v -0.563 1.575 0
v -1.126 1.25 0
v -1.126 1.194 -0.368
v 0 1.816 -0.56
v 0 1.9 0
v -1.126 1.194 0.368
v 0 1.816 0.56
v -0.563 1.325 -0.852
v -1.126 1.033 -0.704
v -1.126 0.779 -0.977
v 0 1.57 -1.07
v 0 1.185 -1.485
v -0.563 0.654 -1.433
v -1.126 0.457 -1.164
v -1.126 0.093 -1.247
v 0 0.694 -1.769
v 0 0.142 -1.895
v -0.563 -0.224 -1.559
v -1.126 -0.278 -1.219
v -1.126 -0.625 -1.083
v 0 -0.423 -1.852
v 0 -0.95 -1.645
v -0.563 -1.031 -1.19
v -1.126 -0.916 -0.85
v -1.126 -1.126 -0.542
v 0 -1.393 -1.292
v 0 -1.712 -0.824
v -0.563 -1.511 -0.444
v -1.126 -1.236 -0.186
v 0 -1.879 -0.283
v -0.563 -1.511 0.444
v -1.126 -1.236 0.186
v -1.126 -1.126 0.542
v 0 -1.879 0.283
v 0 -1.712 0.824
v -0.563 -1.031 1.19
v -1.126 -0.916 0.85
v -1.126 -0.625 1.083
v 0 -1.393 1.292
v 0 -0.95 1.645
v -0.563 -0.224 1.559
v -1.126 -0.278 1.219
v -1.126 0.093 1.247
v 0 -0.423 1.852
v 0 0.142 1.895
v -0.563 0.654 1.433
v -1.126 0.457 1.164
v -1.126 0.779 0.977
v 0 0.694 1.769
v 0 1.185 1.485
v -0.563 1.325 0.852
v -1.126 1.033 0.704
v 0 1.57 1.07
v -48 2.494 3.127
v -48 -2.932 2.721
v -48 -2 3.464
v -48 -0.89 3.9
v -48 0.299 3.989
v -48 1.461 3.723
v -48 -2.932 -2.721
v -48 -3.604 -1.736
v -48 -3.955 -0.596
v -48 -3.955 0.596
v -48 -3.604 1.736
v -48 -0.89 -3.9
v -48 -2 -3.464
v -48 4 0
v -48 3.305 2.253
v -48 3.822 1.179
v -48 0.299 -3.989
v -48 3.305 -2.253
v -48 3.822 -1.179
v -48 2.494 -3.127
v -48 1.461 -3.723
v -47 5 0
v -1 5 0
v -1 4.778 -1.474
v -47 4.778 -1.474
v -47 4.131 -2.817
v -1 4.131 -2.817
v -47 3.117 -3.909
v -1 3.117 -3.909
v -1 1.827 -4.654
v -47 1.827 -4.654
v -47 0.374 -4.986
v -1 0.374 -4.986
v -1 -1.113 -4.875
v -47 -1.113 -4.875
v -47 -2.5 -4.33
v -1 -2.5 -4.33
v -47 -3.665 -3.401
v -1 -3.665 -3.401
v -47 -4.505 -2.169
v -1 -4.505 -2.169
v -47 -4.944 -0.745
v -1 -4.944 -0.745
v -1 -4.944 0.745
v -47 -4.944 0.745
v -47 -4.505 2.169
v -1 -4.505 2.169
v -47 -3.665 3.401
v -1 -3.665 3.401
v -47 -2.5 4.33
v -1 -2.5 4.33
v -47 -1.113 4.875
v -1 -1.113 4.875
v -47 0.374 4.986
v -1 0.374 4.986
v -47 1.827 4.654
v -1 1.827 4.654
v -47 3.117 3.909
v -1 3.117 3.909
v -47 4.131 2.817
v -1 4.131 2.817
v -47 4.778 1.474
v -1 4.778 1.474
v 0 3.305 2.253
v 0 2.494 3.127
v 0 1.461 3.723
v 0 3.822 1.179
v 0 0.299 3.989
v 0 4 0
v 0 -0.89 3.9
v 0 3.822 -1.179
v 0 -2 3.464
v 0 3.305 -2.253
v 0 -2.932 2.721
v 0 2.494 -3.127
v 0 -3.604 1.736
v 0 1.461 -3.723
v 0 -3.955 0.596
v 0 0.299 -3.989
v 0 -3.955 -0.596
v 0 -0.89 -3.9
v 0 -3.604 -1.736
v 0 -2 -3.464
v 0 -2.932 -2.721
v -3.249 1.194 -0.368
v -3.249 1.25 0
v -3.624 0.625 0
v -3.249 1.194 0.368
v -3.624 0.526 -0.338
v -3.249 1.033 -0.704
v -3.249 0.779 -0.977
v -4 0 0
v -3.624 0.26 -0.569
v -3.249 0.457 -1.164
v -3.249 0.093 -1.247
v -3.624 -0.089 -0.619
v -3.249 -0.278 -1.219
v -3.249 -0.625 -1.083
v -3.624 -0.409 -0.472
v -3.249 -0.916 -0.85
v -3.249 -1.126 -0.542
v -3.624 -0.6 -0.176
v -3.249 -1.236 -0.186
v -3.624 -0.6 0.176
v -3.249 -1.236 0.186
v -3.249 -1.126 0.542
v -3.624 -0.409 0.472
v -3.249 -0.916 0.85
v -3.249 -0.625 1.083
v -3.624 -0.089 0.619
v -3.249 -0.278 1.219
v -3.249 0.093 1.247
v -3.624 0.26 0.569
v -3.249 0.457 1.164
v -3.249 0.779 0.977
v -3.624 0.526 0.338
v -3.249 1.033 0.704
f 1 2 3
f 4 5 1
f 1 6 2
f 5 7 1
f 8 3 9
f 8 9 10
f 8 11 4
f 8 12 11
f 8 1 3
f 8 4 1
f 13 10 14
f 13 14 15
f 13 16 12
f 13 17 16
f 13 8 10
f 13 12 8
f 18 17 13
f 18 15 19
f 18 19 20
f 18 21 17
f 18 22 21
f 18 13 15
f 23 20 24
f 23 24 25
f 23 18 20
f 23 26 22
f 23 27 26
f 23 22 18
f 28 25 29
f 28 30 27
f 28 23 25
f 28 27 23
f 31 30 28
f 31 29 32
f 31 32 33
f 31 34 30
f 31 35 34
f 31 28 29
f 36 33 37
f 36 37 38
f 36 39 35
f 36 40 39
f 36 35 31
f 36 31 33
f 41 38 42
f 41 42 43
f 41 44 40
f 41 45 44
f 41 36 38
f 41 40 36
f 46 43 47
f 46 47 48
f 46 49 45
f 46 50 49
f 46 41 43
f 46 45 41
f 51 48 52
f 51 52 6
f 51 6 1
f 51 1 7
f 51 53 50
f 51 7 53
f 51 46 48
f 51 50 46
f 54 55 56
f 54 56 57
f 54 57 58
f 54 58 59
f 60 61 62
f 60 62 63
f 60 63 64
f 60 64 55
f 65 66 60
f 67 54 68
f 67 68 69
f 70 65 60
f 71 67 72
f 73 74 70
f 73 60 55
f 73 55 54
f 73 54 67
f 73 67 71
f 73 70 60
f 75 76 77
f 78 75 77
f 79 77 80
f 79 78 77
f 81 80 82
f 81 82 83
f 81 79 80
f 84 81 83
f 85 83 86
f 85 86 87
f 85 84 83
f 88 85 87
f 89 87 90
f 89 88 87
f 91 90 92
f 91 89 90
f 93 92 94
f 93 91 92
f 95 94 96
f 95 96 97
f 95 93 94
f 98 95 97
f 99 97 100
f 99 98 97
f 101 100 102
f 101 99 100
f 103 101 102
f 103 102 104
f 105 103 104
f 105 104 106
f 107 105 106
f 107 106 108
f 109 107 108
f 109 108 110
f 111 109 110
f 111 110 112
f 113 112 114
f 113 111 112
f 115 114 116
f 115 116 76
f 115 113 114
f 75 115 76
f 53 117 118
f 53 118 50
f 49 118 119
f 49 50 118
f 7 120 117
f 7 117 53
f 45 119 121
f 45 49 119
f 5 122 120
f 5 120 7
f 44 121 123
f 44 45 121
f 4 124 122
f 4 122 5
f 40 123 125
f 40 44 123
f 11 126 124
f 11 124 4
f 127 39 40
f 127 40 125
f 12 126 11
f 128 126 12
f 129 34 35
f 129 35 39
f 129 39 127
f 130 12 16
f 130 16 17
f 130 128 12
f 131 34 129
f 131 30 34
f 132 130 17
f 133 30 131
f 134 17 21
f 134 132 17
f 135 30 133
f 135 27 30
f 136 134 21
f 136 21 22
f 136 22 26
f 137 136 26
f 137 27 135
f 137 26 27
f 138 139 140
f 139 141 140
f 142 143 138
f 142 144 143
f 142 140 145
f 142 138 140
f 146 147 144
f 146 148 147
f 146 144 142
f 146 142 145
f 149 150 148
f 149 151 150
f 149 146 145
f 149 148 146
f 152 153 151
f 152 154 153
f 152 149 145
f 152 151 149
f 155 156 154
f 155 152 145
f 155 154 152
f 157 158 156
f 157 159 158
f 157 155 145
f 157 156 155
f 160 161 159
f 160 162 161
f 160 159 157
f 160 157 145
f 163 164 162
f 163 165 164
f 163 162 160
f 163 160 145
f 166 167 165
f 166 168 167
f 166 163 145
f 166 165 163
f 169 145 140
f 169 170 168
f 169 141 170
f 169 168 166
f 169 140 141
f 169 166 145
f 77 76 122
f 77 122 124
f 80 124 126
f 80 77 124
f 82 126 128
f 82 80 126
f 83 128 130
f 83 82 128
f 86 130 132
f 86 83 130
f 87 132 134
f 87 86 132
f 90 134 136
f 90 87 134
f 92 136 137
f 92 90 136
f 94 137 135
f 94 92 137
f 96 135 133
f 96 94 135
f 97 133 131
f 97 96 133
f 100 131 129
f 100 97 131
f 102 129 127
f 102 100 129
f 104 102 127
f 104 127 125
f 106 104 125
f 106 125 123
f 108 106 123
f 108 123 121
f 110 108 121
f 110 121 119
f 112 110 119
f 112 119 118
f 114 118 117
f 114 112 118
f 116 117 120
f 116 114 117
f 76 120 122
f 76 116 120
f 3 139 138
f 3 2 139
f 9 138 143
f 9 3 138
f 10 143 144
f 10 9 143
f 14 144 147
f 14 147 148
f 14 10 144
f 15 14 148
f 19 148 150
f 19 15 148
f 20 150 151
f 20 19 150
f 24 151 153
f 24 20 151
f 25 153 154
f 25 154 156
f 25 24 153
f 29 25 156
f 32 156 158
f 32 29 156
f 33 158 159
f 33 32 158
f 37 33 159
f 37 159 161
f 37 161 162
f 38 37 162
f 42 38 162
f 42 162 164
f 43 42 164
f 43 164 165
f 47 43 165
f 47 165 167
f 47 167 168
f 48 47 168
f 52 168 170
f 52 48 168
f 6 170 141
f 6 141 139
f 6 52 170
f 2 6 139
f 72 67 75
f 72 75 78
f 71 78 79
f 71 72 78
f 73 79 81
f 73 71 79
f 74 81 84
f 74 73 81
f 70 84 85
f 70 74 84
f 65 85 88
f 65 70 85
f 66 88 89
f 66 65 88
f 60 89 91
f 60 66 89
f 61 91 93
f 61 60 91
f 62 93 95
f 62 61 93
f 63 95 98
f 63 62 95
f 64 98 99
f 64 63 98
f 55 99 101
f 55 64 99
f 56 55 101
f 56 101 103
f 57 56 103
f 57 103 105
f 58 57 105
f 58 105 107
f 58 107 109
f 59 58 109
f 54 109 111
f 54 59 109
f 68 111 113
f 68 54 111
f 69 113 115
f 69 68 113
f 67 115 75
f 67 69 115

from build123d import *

# Parameters (mm, degrees)
CHAMFER1_SIZE = 1


with BuildPart() as part:
    # Sketch1 → Revolve1 (revolve)
    with BuildSketch(Plane.XY):
        Polygon((0, 1.9), (0, 5), (-48, 5), (-48, 0), (-4, 0), (-3.248924226, 1.25), (-1.125833025, 1.25), align=None)
    revolve(axis=Axis((0, 0, 0), (-1, 0, 0)))

    # Chamfer1
    chamfer1_edges = [part.edges().sort_by_distance(p)[0] for p in [
        (0, -5, 0),
        (-48, -5, 0),
    ]]
    chamfer(chamfer1_edges, length=CHAMFER1_SIZE)


solid = part.part
